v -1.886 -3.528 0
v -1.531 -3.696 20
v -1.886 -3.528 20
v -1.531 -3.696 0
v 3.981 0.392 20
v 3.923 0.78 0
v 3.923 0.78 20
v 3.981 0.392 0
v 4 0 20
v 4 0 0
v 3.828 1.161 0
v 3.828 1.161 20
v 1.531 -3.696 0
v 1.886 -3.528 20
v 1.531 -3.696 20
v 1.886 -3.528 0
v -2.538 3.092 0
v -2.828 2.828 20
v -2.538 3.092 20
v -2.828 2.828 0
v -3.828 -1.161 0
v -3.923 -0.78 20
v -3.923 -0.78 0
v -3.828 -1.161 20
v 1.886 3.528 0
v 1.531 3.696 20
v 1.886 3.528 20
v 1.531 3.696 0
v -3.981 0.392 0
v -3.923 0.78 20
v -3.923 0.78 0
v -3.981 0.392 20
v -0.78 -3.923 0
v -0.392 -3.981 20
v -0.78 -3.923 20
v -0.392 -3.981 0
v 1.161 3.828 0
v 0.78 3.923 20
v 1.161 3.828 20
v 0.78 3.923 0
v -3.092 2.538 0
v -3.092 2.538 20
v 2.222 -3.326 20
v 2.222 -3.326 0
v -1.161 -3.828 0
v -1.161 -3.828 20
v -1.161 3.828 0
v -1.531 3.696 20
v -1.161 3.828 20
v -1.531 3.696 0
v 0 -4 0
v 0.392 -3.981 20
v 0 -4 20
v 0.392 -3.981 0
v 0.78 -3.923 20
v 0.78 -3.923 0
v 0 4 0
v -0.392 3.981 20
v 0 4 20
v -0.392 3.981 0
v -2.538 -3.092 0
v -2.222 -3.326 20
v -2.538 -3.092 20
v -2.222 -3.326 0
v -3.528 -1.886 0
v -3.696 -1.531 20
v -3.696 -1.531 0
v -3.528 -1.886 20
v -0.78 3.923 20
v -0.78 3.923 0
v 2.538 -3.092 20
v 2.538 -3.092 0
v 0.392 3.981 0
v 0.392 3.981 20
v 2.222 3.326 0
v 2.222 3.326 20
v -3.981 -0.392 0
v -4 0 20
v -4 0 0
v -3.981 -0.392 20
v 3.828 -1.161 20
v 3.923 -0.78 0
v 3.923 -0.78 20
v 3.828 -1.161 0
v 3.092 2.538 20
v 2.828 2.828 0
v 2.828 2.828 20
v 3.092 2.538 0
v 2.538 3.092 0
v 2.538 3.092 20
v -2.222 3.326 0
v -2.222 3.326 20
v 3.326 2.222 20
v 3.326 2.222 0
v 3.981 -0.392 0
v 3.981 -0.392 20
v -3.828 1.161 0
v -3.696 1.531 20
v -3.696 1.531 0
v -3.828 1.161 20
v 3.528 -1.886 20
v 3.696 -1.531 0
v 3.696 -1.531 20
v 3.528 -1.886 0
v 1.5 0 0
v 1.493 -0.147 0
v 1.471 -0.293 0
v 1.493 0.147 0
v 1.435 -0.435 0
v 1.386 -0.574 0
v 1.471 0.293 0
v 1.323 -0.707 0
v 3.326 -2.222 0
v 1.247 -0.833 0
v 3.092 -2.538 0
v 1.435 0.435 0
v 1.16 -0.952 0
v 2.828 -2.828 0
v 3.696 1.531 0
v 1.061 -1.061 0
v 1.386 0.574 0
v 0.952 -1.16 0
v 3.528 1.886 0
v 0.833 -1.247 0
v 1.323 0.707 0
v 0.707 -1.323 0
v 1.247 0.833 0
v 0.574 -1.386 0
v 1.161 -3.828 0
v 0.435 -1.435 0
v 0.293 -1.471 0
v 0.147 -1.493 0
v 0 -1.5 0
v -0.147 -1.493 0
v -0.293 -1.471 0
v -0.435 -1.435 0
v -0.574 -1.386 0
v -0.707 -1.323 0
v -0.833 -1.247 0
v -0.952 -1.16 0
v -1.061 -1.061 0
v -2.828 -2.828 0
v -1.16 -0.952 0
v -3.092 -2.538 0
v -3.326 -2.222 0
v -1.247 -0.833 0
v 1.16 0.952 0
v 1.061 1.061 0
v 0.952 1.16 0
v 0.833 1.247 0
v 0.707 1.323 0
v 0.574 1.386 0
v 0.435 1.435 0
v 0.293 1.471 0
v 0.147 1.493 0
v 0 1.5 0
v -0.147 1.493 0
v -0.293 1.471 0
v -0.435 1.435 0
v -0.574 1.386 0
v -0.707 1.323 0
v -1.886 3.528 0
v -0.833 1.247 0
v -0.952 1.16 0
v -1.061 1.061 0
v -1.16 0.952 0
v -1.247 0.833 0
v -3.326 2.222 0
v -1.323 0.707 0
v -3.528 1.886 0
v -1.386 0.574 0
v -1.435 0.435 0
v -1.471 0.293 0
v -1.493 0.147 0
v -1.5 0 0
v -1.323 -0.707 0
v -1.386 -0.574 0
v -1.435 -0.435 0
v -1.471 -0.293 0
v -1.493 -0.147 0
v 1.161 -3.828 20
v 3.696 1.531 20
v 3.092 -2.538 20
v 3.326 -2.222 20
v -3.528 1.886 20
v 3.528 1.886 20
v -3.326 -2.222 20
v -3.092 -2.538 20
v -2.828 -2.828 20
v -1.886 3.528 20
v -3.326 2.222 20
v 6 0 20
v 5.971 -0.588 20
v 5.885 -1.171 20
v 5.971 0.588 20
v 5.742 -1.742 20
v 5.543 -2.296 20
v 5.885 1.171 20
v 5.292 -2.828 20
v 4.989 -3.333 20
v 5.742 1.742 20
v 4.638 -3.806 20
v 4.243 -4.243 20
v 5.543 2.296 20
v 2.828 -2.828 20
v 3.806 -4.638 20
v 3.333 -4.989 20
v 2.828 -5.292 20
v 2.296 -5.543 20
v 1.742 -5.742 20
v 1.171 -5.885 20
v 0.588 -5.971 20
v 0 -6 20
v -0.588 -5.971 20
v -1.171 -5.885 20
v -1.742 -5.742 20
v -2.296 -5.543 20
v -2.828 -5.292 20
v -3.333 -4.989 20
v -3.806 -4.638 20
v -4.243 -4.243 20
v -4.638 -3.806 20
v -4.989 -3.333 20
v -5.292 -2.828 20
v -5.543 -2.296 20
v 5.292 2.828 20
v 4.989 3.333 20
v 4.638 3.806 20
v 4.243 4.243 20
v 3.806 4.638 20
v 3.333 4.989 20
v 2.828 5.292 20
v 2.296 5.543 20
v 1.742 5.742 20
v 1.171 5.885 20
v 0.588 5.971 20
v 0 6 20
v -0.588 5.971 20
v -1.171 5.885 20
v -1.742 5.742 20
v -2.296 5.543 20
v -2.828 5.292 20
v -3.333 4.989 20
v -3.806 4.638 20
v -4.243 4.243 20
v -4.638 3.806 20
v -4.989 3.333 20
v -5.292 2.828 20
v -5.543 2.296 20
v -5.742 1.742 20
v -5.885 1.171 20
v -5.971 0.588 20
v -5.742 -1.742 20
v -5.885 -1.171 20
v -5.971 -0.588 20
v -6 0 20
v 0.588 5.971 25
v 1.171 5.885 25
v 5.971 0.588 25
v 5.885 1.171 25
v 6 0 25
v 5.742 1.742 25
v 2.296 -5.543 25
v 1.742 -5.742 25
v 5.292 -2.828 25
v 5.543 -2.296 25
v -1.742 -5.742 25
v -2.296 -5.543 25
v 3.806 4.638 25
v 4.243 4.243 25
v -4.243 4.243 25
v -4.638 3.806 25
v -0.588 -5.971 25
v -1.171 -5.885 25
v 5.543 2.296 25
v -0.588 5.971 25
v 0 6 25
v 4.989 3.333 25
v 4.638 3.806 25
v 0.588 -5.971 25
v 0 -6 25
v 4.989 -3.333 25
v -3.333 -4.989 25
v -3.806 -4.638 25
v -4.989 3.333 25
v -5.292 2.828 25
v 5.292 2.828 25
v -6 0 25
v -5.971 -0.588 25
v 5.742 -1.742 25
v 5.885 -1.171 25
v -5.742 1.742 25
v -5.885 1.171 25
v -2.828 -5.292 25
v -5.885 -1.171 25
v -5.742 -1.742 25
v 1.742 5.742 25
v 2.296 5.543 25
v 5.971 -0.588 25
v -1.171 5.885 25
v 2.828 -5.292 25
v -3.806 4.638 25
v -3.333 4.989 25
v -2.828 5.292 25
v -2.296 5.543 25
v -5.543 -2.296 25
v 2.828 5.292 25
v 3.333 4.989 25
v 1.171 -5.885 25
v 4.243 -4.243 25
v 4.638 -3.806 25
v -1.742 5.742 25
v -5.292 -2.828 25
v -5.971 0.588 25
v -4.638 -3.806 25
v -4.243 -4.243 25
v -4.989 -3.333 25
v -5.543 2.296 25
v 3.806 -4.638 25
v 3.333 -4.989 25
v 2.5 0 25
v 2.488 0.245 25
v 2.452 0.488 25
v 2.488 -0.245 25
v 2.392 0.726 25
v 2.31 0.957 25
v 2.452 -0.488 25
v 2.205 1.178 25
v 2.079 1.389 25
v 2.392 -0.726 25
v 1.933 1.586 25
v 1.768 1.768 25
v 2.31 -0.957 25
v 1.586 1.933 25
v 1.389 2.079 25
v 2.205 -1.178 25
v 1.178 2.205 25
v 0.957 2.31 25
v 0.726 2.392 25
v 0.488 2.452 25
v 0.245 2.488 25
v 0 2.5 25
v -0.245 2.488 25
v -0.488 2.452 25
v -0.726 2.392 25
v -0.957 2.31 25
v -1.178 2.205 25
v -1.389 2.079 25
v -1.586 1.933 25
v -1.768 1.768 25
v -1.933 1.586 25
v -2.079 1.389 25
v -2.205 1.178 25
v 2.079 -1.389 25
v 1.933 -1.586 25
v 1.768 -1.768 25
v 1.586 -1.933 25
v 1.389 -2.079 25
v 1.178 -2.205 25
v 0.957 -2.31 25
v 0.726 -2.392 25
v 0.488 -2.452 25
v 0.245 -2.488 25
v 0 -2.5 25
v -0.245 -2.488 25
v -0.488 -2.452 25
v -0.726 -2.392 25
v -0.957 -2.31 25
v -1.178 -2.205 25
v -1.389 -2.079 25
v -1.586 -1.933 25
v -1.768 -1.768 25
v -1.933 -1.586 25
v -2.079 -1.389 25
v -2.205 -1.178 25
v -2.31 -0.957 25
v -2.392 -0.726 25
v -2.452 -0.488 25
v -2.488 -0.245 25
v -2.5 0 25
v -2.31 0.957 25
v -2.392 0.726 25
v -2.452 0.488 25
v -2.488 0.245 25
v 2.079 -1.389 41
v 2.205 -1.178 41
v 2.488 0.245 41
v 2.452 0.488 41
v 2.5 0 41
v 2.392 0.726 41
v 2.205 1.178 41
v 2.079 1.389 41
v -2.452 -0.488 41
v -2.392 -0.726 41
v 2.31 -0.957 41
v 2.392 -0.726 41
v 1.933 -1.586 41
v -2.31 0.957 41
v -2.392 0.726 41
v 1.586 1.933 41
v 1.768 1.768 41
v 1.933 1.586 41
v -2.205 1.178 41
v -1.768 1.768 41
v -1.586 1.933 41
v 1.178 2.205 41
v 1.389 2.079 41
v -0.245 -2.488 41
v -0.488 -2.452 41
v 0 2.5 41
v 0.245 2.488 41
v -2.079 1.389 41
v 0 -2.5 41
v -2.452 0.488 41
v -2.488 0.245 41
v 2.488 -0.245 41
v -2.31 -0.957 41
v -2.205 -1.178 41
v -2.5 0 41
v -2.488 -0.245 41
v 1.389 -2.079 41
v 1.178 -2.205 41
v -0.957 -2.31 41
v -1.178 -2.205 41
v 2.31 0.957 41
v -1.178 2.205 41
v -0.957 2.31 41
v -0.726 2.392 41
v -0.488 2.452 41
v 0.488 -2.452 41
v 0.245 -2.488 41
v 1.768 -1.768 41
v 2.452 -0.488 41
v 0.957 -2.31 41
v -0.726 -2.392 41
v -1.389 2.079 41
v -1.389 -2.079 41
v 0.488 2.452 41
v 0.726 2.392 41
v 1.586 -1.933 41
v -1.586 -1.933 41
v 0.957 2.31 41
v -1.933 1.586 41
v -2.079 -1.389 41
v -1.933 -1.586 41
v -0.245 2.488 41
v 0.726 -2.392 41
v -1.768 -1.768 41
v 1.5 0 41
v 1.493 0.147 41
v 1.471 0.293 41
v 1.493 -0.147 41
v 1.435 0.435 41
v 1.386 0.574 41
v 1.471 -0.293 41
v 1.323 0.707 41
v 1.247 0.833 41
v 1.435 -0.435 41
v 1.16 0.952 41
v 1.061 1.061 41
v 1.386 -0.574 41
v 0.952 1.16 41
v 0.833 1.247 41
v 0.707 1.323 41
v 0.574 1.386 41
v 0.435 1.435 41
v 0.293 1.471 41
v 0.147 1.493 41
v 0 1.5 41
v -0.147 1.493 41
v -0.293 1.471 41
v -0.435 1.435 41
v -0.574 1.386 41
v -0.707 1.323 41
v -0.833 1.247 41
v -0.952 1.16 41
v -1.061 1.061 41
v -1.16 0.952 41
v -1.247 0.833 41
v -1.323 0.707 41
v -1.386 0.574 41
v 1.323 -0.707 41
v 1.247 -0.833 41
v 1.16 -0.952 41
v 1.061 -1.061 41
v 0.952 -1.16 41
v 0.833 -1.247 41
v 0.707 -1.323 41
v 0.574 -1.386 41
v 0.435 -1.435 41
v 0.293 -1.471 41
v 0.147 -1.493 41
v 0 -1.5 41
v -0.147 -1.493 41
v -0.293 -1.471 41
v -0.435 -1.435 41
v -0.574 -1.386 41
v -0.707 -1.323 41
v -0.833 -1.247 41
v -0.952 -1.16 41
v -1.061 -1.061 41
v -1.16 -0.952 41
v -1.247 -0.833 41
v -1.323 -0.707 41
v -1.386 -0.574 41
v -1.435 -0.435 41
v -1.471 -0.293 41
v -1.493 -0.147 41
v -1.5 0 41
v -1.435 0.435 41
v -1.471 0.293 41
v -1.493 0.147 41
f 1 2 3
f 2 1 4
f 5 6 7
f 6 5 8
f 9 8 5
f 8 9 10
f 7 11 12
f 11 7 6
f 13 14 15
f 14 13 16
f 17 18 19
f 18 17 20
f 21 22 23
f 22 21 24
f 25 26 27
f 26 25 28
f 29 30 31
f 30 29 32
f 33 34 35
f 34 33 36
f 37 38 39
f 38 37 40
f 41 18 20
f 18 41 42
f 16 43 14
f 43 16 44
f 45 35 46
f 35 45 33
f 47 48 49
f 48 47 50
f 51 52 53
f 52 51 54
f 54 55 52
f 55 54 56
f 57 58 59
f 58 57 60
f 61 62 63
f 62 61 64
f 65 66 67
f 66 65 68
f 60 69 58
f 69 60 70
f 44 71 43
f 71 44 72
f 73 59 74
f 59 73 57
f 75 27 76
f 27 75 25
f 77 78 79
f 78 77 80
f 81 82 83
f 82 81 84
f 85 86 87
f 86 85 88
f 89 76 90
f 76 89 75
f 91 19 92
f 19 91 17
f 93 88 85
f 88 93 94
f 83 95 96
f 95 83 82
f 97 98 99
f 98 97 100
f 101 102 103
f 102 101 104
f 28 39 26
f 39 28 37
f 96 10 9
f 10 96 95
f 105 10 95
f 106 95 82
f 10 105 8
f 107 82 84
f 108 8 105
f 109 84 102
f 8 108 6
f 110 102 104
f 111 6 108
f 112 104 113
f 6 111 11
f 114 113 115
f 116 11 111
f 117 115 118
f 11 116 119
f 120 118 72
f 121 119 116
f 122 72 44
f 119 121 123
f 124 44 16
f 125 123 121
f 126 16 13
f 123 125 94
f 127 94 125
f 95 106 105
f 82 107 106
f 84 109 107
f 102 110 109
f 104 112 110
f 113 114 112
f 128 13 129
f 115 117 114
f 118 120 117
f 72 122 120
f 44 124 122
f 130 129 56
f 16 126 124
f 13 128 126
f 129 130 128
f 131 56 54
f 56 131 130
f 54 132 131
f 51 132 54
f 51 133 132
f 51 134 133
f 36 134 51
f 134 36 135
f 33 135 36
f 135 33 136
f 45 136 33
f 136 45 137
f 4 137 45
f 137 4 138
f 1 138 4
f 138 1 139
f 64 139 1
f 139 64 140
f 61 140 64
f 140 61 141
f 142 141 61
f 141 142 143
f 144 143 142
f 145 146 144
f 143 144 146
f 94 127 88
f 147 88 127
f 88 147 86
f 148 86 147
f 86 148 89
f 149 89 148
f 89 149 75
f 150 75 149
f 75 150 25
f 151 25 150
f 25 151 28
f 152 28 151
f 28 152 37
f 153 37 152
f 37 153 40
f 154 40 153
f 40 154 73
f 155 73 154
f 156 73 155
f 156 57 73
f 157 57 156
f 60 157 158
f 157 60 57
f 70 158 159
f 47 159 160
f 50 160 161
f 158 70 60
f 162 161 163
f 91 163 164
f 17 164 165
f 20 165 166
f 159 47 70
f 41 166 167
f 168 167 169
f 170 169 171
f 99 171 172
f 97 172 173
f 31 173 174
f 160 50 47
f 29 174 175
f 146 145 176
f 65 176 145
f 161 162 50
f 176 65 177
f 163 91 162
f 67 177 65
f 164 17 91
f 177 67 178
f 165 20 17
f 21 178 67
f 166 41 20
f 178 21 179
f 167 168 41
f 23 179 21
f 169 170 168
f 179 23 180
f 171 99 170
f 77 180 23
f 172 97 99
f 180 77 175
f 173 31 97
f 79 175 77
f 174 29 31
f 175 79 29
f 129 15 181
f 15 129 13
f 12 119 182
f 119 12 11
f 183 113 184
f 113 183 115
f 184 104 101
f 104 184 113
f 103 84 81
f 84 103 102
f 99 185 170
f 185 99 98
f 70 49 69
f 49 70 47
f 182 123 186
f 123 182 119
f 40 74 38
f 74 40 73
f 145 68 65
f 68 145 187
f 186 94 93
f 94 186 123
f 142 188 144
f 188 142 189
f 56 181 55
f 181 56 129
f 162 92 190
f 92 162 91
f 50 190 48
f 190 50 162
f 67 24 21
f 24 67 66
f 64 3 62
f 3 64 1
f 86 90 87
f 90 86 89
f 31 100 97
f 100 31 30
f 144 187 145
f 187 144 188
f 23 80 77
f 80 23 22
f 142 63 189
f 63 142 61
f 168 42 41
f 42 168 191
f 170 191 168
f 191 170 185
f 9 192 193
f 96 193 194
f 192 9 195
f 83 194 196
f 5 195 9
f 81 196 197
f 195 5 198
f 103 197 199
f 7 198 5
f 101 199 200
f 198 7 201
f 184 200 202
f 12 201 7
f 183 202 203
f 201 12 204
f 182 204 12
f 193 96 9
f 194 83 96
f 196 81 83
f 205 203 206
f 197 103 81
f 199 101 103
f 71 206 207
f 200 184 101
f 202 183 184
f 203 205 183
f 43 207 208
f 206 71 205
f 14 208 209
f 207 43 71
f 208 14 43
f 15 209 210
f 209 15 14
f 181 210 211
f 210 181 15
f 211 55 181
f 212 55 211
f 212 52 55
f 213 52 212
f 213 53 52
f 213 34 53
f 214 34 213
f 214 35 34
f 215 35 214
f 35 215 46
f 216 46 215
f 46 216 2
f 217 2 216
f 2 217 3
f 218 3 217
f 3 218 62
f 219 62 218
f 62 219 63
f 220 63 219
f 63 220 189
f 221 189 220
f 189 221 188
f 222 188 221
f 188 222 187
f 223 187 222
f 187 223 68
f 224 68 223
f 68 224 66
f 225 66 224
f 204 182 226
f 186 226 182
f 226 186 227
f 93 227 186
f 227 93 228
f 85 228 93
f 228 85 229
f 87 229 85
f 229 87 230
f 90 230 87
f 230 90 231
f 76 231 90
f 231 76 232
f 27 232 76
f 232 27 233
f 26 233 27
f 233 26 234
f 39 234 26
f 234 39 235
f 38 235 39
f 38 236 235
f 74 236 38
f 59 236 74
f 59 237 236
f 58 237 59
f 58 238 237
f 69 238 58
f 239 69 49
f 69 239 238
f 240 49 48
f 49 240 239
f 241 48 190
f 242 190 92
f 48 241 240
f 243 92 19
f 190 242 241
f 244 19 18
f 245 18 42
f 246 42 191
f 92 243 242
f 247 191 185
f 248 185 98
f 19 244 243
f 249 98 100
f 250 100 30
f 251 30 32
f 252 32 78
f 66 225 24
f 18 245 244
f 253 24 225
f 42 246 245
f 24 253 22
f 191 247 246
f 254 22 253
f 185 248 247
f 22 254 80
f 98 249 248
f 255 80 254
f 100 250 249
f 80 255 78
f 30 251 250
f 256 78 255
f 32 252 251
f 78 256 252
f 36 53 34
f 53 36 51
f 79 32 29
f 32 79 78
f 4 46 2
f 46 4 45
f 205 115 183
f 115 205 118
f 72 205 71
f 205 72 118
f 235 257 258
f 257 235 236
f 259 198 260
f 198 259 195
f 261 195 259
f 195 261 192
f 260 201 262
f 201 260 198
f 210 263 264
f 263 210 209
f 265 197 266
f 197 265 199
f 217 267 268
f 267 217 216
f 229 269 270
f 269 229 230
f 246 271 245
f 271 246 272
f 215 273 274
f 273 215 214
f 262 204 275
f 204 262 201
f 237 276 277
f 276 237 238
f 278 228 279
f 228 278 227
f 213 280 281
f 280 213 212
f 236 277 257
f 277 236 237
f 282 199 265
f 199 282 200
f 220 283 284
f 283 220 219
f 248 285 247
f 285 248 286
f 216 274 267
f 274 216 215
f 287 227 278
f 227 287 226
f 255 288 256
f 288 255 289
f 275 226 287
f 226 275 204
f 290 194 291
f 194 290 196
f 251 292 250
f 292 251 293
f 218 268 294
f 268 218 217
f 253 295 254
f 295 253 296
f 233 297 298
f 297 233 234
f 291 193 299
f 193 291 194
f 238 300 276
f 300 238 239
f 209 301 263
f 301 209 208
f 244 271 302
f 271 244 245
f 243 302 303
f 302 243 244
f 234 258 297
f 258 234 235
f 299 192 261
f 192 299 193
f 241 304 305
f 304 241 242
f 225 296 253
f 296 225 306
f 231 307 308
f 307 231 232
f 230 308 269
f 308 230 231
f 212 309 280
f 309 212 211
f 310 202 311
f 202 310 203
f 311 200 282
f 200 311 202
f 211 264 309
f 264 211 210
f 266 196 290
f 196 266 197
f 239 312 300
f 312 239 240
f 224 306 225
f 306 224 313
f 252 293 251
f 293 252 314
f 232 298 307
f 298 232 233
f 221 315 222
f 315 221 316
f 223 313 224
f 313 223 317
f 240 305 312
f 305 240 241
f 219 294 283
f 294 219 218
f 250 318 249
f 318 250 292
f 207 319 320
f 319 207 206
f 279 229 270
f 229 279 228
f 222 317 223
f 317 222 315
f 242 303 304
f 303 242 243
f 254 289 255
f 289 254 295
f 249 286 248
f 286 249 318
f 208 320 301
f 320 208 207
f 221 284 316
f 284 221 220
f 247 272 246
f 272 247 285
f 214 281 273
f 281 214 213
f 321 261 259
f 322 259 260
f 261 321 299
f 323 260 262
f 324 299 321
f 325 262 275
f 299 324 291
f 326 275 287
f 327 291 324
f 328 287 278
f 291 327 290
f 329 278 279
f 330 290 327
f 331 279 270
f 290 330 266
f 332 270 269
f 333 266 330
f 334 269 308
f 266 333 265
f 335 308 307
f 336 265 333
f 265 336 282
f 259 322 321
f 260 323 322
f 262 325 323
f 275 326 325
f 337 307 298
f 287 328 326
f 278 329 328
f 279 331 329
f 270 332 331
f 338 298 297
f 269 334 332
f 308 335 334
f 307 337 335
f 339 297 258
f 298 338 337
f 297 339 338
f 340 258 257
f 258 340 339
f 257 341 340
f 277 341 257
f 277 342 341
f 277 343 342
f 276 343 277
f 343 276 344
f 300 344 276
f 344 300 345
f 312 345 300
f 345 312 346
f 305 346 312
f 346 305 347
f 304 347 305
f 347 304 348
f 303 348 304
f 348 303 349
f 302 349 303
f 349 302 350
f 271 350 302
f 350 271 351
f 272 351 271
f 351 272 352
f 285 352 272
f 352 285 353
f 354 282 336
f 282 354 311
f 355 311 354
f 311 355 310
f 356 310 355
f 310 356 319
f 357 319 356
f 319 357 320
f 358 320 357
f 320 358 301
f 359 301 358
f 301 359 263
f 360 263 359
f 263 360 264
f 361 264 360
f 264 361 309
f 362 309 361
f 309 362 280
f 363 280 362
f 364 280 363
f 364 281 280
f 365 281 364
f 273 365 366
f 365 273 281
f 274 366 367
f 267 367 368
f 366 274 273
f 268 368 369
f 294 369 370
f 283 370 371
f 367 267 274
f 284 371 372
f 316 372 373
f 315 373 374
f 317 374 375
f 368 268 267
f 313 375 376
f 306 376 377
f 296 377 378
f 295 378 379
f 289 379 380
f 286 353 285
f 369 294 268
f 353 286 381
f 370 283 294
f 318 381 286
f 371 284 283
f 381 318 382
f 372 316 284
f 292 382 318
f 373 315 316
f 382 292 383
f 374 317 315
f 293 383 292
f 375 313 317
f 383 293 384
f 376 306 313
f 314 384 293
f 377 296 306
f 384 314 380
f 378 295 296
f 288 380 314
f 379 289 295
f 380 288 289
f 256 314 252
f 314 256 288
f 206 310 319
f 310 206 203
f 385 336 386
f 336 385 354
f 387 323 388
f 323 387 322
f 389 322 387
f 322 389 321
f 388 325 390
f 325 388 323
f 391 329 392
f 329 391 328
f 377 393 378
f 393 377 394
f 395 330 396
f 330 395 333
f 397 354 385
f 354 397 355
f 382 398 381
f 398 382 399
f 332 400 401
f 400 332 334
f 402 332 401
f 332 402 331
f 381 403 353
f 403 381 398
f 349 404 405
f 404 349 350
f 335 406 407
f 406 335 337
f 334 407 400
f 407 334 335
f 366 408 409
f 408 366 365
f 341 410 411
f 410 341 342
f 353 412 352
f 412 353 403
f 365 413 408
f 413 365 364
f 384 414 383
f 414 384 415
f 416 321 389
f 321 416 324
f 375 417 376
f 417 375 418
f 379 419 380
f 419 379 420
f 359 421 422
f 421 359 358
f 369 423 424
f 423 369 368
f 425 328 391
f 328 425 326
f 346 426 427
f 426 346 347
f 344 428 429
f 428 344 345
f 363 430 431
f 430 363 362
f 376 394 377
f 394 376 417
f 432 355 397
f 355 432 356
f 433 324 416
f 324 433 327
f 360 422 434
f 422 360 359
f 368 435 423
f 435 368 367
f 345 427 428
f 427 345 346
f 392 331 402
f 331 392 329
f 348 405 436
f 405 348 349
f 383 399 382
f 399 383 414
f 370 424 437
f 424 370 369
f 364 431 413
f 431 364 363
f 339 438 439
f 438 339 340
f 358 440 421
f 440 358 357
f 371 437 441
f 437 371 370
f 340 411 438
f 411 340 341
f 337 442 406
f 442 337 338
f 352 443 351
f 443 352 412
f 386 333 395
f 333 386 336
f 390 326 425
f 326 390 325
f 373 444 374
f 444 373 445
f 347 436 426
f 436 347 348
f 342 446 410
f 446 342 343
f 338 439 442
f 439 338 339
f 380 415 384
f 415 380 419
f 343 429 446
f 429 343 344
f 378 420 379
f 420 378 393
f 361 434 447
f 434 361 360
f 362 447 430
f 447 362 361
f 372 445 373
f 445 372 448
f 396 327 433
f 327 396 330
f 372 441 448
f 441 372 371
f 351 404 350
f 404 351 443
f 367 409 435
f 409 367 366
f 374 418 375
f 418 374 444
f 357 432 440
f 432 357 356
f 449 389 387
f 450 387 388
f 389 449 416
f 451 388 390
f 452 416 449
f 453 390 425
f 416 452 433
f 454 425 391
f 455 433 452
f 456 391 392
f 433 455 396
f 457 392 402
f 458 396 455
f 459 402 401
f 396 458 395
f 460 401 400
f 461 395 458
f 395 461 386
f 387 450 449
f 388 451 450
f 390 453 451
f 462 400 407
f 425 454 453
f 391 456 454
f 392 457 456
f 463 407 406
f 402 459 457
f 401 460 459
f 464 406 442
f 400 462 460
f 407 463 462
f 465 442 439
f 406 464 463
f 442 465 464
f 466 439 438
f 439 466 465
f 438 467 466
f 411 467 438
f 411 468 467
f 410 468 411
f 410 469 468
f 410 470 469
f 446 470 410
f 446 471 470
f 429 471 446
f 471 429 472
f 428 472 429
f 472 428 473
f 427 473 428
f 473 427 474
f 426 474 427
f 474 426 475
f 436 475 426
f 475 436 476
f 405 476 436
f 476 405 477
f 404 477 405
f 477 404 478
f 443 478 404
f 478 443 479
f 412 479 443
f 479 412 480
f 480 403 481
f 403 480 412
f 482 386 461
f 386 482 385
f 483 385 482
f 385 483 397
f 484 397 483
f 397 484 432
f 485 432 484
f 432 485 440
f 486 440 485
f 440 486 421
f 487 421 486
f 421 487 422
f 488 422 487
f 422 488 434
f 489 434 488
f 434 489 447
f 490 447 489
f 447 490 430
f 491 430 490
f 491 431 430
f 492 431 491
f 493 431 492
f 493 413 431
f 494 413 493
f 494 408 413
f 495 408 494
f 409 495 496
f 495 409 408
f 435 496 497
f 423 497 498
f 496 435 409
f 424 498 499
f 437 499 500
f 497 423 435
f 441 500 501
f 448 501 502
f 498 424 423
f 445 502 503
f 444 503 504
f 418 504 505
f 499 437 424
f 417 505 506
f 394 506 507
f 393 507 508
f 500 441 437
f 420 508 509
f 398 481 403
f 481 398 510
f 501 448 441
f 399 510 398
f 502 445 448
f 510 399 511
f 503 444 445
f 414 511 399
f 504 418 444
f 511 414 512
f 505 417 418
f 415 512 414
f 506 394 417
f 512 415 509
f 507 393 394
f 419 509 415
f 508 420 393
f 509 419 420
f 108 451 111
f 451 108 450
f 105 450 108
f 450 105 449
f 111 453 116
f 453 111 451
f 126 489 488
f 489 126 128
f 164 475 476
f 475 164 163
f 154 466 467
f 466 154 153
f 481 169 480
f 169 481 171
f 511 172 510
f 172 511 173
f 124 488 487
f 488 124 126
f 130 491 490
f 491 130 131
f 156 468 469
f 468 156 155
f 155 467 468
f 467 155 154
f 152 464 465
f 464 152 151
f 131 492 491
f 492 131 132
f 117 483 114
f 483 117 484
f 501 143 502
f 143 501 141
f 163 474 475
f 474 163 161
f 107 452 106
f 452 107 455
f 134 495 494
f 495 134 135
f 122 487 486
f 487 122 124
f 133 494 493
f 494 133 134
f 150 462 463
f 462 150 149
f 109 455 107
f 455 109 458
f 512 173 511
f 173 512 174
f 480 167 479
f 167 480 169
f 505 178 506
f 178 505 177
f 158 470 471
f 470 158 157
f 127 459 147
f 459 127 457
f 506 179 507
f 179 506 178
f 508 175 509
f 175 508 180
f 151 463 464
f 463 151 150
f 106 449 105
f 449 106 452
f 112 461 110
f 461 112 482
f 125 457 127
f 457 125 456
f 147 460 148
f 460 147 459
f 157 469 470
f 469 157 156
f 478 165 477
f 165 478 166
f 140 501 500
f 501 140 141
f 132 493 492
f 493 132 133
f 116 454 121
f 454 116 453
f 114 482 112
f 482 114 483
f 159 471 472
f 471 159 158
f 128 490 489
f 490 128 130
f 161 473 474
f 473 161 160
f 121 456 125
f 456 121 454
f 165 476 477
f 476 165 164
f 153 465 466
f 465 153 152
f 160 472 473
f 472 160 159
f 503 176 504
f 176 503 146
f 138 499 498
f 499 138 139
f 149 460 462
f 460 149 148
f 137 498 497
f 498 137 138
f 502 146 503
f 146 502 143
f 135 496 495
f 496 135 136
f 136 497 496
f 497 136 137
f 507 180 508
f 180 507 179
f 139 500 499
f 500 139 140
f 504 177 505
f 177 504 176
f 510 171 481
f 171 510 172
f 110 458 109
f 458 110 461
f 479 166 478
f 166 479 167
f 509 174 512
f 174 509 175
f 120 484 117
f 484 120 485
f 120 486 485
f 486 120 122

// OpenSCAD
// Hose-barb reducer: 8 mm OD barb -> 5 mm OD barb
// Print orientation: standing upright along Z

$fn = 64;

// ---- Dimensions (mm) ----
barb_od       = 8;    // outer diameter of the 8 mm tubing barb
collar_od     = 12;   // outer diameter of the collar
collar_h      = 5;    // collar height (z = 20 to 25)
bore          = 3;    // through-bore diameter
eps           = 0.5;  // overshoot for clean boolean cuts

// ---- Model ----
difference() {
    union() {
        // 8 mm barb (z = 0 to 20)
        translate([0, 0, 0])
            cylinder(h = 20, d = barb_od);

        // Collar (z = 20 to 25)
        translate([0, 0, 20])
            cylinder(h = collar_h, d = collar_od);

        // 5 mm barb (z = 25 to 41)
        translate([0, 0, 25])
            cylinder(h = 16, d = 5);
    }

    // Through bore
    translate([0, 0, -eps])
        cylinder(h = 41 + 2 * eps, d = bore);
}
